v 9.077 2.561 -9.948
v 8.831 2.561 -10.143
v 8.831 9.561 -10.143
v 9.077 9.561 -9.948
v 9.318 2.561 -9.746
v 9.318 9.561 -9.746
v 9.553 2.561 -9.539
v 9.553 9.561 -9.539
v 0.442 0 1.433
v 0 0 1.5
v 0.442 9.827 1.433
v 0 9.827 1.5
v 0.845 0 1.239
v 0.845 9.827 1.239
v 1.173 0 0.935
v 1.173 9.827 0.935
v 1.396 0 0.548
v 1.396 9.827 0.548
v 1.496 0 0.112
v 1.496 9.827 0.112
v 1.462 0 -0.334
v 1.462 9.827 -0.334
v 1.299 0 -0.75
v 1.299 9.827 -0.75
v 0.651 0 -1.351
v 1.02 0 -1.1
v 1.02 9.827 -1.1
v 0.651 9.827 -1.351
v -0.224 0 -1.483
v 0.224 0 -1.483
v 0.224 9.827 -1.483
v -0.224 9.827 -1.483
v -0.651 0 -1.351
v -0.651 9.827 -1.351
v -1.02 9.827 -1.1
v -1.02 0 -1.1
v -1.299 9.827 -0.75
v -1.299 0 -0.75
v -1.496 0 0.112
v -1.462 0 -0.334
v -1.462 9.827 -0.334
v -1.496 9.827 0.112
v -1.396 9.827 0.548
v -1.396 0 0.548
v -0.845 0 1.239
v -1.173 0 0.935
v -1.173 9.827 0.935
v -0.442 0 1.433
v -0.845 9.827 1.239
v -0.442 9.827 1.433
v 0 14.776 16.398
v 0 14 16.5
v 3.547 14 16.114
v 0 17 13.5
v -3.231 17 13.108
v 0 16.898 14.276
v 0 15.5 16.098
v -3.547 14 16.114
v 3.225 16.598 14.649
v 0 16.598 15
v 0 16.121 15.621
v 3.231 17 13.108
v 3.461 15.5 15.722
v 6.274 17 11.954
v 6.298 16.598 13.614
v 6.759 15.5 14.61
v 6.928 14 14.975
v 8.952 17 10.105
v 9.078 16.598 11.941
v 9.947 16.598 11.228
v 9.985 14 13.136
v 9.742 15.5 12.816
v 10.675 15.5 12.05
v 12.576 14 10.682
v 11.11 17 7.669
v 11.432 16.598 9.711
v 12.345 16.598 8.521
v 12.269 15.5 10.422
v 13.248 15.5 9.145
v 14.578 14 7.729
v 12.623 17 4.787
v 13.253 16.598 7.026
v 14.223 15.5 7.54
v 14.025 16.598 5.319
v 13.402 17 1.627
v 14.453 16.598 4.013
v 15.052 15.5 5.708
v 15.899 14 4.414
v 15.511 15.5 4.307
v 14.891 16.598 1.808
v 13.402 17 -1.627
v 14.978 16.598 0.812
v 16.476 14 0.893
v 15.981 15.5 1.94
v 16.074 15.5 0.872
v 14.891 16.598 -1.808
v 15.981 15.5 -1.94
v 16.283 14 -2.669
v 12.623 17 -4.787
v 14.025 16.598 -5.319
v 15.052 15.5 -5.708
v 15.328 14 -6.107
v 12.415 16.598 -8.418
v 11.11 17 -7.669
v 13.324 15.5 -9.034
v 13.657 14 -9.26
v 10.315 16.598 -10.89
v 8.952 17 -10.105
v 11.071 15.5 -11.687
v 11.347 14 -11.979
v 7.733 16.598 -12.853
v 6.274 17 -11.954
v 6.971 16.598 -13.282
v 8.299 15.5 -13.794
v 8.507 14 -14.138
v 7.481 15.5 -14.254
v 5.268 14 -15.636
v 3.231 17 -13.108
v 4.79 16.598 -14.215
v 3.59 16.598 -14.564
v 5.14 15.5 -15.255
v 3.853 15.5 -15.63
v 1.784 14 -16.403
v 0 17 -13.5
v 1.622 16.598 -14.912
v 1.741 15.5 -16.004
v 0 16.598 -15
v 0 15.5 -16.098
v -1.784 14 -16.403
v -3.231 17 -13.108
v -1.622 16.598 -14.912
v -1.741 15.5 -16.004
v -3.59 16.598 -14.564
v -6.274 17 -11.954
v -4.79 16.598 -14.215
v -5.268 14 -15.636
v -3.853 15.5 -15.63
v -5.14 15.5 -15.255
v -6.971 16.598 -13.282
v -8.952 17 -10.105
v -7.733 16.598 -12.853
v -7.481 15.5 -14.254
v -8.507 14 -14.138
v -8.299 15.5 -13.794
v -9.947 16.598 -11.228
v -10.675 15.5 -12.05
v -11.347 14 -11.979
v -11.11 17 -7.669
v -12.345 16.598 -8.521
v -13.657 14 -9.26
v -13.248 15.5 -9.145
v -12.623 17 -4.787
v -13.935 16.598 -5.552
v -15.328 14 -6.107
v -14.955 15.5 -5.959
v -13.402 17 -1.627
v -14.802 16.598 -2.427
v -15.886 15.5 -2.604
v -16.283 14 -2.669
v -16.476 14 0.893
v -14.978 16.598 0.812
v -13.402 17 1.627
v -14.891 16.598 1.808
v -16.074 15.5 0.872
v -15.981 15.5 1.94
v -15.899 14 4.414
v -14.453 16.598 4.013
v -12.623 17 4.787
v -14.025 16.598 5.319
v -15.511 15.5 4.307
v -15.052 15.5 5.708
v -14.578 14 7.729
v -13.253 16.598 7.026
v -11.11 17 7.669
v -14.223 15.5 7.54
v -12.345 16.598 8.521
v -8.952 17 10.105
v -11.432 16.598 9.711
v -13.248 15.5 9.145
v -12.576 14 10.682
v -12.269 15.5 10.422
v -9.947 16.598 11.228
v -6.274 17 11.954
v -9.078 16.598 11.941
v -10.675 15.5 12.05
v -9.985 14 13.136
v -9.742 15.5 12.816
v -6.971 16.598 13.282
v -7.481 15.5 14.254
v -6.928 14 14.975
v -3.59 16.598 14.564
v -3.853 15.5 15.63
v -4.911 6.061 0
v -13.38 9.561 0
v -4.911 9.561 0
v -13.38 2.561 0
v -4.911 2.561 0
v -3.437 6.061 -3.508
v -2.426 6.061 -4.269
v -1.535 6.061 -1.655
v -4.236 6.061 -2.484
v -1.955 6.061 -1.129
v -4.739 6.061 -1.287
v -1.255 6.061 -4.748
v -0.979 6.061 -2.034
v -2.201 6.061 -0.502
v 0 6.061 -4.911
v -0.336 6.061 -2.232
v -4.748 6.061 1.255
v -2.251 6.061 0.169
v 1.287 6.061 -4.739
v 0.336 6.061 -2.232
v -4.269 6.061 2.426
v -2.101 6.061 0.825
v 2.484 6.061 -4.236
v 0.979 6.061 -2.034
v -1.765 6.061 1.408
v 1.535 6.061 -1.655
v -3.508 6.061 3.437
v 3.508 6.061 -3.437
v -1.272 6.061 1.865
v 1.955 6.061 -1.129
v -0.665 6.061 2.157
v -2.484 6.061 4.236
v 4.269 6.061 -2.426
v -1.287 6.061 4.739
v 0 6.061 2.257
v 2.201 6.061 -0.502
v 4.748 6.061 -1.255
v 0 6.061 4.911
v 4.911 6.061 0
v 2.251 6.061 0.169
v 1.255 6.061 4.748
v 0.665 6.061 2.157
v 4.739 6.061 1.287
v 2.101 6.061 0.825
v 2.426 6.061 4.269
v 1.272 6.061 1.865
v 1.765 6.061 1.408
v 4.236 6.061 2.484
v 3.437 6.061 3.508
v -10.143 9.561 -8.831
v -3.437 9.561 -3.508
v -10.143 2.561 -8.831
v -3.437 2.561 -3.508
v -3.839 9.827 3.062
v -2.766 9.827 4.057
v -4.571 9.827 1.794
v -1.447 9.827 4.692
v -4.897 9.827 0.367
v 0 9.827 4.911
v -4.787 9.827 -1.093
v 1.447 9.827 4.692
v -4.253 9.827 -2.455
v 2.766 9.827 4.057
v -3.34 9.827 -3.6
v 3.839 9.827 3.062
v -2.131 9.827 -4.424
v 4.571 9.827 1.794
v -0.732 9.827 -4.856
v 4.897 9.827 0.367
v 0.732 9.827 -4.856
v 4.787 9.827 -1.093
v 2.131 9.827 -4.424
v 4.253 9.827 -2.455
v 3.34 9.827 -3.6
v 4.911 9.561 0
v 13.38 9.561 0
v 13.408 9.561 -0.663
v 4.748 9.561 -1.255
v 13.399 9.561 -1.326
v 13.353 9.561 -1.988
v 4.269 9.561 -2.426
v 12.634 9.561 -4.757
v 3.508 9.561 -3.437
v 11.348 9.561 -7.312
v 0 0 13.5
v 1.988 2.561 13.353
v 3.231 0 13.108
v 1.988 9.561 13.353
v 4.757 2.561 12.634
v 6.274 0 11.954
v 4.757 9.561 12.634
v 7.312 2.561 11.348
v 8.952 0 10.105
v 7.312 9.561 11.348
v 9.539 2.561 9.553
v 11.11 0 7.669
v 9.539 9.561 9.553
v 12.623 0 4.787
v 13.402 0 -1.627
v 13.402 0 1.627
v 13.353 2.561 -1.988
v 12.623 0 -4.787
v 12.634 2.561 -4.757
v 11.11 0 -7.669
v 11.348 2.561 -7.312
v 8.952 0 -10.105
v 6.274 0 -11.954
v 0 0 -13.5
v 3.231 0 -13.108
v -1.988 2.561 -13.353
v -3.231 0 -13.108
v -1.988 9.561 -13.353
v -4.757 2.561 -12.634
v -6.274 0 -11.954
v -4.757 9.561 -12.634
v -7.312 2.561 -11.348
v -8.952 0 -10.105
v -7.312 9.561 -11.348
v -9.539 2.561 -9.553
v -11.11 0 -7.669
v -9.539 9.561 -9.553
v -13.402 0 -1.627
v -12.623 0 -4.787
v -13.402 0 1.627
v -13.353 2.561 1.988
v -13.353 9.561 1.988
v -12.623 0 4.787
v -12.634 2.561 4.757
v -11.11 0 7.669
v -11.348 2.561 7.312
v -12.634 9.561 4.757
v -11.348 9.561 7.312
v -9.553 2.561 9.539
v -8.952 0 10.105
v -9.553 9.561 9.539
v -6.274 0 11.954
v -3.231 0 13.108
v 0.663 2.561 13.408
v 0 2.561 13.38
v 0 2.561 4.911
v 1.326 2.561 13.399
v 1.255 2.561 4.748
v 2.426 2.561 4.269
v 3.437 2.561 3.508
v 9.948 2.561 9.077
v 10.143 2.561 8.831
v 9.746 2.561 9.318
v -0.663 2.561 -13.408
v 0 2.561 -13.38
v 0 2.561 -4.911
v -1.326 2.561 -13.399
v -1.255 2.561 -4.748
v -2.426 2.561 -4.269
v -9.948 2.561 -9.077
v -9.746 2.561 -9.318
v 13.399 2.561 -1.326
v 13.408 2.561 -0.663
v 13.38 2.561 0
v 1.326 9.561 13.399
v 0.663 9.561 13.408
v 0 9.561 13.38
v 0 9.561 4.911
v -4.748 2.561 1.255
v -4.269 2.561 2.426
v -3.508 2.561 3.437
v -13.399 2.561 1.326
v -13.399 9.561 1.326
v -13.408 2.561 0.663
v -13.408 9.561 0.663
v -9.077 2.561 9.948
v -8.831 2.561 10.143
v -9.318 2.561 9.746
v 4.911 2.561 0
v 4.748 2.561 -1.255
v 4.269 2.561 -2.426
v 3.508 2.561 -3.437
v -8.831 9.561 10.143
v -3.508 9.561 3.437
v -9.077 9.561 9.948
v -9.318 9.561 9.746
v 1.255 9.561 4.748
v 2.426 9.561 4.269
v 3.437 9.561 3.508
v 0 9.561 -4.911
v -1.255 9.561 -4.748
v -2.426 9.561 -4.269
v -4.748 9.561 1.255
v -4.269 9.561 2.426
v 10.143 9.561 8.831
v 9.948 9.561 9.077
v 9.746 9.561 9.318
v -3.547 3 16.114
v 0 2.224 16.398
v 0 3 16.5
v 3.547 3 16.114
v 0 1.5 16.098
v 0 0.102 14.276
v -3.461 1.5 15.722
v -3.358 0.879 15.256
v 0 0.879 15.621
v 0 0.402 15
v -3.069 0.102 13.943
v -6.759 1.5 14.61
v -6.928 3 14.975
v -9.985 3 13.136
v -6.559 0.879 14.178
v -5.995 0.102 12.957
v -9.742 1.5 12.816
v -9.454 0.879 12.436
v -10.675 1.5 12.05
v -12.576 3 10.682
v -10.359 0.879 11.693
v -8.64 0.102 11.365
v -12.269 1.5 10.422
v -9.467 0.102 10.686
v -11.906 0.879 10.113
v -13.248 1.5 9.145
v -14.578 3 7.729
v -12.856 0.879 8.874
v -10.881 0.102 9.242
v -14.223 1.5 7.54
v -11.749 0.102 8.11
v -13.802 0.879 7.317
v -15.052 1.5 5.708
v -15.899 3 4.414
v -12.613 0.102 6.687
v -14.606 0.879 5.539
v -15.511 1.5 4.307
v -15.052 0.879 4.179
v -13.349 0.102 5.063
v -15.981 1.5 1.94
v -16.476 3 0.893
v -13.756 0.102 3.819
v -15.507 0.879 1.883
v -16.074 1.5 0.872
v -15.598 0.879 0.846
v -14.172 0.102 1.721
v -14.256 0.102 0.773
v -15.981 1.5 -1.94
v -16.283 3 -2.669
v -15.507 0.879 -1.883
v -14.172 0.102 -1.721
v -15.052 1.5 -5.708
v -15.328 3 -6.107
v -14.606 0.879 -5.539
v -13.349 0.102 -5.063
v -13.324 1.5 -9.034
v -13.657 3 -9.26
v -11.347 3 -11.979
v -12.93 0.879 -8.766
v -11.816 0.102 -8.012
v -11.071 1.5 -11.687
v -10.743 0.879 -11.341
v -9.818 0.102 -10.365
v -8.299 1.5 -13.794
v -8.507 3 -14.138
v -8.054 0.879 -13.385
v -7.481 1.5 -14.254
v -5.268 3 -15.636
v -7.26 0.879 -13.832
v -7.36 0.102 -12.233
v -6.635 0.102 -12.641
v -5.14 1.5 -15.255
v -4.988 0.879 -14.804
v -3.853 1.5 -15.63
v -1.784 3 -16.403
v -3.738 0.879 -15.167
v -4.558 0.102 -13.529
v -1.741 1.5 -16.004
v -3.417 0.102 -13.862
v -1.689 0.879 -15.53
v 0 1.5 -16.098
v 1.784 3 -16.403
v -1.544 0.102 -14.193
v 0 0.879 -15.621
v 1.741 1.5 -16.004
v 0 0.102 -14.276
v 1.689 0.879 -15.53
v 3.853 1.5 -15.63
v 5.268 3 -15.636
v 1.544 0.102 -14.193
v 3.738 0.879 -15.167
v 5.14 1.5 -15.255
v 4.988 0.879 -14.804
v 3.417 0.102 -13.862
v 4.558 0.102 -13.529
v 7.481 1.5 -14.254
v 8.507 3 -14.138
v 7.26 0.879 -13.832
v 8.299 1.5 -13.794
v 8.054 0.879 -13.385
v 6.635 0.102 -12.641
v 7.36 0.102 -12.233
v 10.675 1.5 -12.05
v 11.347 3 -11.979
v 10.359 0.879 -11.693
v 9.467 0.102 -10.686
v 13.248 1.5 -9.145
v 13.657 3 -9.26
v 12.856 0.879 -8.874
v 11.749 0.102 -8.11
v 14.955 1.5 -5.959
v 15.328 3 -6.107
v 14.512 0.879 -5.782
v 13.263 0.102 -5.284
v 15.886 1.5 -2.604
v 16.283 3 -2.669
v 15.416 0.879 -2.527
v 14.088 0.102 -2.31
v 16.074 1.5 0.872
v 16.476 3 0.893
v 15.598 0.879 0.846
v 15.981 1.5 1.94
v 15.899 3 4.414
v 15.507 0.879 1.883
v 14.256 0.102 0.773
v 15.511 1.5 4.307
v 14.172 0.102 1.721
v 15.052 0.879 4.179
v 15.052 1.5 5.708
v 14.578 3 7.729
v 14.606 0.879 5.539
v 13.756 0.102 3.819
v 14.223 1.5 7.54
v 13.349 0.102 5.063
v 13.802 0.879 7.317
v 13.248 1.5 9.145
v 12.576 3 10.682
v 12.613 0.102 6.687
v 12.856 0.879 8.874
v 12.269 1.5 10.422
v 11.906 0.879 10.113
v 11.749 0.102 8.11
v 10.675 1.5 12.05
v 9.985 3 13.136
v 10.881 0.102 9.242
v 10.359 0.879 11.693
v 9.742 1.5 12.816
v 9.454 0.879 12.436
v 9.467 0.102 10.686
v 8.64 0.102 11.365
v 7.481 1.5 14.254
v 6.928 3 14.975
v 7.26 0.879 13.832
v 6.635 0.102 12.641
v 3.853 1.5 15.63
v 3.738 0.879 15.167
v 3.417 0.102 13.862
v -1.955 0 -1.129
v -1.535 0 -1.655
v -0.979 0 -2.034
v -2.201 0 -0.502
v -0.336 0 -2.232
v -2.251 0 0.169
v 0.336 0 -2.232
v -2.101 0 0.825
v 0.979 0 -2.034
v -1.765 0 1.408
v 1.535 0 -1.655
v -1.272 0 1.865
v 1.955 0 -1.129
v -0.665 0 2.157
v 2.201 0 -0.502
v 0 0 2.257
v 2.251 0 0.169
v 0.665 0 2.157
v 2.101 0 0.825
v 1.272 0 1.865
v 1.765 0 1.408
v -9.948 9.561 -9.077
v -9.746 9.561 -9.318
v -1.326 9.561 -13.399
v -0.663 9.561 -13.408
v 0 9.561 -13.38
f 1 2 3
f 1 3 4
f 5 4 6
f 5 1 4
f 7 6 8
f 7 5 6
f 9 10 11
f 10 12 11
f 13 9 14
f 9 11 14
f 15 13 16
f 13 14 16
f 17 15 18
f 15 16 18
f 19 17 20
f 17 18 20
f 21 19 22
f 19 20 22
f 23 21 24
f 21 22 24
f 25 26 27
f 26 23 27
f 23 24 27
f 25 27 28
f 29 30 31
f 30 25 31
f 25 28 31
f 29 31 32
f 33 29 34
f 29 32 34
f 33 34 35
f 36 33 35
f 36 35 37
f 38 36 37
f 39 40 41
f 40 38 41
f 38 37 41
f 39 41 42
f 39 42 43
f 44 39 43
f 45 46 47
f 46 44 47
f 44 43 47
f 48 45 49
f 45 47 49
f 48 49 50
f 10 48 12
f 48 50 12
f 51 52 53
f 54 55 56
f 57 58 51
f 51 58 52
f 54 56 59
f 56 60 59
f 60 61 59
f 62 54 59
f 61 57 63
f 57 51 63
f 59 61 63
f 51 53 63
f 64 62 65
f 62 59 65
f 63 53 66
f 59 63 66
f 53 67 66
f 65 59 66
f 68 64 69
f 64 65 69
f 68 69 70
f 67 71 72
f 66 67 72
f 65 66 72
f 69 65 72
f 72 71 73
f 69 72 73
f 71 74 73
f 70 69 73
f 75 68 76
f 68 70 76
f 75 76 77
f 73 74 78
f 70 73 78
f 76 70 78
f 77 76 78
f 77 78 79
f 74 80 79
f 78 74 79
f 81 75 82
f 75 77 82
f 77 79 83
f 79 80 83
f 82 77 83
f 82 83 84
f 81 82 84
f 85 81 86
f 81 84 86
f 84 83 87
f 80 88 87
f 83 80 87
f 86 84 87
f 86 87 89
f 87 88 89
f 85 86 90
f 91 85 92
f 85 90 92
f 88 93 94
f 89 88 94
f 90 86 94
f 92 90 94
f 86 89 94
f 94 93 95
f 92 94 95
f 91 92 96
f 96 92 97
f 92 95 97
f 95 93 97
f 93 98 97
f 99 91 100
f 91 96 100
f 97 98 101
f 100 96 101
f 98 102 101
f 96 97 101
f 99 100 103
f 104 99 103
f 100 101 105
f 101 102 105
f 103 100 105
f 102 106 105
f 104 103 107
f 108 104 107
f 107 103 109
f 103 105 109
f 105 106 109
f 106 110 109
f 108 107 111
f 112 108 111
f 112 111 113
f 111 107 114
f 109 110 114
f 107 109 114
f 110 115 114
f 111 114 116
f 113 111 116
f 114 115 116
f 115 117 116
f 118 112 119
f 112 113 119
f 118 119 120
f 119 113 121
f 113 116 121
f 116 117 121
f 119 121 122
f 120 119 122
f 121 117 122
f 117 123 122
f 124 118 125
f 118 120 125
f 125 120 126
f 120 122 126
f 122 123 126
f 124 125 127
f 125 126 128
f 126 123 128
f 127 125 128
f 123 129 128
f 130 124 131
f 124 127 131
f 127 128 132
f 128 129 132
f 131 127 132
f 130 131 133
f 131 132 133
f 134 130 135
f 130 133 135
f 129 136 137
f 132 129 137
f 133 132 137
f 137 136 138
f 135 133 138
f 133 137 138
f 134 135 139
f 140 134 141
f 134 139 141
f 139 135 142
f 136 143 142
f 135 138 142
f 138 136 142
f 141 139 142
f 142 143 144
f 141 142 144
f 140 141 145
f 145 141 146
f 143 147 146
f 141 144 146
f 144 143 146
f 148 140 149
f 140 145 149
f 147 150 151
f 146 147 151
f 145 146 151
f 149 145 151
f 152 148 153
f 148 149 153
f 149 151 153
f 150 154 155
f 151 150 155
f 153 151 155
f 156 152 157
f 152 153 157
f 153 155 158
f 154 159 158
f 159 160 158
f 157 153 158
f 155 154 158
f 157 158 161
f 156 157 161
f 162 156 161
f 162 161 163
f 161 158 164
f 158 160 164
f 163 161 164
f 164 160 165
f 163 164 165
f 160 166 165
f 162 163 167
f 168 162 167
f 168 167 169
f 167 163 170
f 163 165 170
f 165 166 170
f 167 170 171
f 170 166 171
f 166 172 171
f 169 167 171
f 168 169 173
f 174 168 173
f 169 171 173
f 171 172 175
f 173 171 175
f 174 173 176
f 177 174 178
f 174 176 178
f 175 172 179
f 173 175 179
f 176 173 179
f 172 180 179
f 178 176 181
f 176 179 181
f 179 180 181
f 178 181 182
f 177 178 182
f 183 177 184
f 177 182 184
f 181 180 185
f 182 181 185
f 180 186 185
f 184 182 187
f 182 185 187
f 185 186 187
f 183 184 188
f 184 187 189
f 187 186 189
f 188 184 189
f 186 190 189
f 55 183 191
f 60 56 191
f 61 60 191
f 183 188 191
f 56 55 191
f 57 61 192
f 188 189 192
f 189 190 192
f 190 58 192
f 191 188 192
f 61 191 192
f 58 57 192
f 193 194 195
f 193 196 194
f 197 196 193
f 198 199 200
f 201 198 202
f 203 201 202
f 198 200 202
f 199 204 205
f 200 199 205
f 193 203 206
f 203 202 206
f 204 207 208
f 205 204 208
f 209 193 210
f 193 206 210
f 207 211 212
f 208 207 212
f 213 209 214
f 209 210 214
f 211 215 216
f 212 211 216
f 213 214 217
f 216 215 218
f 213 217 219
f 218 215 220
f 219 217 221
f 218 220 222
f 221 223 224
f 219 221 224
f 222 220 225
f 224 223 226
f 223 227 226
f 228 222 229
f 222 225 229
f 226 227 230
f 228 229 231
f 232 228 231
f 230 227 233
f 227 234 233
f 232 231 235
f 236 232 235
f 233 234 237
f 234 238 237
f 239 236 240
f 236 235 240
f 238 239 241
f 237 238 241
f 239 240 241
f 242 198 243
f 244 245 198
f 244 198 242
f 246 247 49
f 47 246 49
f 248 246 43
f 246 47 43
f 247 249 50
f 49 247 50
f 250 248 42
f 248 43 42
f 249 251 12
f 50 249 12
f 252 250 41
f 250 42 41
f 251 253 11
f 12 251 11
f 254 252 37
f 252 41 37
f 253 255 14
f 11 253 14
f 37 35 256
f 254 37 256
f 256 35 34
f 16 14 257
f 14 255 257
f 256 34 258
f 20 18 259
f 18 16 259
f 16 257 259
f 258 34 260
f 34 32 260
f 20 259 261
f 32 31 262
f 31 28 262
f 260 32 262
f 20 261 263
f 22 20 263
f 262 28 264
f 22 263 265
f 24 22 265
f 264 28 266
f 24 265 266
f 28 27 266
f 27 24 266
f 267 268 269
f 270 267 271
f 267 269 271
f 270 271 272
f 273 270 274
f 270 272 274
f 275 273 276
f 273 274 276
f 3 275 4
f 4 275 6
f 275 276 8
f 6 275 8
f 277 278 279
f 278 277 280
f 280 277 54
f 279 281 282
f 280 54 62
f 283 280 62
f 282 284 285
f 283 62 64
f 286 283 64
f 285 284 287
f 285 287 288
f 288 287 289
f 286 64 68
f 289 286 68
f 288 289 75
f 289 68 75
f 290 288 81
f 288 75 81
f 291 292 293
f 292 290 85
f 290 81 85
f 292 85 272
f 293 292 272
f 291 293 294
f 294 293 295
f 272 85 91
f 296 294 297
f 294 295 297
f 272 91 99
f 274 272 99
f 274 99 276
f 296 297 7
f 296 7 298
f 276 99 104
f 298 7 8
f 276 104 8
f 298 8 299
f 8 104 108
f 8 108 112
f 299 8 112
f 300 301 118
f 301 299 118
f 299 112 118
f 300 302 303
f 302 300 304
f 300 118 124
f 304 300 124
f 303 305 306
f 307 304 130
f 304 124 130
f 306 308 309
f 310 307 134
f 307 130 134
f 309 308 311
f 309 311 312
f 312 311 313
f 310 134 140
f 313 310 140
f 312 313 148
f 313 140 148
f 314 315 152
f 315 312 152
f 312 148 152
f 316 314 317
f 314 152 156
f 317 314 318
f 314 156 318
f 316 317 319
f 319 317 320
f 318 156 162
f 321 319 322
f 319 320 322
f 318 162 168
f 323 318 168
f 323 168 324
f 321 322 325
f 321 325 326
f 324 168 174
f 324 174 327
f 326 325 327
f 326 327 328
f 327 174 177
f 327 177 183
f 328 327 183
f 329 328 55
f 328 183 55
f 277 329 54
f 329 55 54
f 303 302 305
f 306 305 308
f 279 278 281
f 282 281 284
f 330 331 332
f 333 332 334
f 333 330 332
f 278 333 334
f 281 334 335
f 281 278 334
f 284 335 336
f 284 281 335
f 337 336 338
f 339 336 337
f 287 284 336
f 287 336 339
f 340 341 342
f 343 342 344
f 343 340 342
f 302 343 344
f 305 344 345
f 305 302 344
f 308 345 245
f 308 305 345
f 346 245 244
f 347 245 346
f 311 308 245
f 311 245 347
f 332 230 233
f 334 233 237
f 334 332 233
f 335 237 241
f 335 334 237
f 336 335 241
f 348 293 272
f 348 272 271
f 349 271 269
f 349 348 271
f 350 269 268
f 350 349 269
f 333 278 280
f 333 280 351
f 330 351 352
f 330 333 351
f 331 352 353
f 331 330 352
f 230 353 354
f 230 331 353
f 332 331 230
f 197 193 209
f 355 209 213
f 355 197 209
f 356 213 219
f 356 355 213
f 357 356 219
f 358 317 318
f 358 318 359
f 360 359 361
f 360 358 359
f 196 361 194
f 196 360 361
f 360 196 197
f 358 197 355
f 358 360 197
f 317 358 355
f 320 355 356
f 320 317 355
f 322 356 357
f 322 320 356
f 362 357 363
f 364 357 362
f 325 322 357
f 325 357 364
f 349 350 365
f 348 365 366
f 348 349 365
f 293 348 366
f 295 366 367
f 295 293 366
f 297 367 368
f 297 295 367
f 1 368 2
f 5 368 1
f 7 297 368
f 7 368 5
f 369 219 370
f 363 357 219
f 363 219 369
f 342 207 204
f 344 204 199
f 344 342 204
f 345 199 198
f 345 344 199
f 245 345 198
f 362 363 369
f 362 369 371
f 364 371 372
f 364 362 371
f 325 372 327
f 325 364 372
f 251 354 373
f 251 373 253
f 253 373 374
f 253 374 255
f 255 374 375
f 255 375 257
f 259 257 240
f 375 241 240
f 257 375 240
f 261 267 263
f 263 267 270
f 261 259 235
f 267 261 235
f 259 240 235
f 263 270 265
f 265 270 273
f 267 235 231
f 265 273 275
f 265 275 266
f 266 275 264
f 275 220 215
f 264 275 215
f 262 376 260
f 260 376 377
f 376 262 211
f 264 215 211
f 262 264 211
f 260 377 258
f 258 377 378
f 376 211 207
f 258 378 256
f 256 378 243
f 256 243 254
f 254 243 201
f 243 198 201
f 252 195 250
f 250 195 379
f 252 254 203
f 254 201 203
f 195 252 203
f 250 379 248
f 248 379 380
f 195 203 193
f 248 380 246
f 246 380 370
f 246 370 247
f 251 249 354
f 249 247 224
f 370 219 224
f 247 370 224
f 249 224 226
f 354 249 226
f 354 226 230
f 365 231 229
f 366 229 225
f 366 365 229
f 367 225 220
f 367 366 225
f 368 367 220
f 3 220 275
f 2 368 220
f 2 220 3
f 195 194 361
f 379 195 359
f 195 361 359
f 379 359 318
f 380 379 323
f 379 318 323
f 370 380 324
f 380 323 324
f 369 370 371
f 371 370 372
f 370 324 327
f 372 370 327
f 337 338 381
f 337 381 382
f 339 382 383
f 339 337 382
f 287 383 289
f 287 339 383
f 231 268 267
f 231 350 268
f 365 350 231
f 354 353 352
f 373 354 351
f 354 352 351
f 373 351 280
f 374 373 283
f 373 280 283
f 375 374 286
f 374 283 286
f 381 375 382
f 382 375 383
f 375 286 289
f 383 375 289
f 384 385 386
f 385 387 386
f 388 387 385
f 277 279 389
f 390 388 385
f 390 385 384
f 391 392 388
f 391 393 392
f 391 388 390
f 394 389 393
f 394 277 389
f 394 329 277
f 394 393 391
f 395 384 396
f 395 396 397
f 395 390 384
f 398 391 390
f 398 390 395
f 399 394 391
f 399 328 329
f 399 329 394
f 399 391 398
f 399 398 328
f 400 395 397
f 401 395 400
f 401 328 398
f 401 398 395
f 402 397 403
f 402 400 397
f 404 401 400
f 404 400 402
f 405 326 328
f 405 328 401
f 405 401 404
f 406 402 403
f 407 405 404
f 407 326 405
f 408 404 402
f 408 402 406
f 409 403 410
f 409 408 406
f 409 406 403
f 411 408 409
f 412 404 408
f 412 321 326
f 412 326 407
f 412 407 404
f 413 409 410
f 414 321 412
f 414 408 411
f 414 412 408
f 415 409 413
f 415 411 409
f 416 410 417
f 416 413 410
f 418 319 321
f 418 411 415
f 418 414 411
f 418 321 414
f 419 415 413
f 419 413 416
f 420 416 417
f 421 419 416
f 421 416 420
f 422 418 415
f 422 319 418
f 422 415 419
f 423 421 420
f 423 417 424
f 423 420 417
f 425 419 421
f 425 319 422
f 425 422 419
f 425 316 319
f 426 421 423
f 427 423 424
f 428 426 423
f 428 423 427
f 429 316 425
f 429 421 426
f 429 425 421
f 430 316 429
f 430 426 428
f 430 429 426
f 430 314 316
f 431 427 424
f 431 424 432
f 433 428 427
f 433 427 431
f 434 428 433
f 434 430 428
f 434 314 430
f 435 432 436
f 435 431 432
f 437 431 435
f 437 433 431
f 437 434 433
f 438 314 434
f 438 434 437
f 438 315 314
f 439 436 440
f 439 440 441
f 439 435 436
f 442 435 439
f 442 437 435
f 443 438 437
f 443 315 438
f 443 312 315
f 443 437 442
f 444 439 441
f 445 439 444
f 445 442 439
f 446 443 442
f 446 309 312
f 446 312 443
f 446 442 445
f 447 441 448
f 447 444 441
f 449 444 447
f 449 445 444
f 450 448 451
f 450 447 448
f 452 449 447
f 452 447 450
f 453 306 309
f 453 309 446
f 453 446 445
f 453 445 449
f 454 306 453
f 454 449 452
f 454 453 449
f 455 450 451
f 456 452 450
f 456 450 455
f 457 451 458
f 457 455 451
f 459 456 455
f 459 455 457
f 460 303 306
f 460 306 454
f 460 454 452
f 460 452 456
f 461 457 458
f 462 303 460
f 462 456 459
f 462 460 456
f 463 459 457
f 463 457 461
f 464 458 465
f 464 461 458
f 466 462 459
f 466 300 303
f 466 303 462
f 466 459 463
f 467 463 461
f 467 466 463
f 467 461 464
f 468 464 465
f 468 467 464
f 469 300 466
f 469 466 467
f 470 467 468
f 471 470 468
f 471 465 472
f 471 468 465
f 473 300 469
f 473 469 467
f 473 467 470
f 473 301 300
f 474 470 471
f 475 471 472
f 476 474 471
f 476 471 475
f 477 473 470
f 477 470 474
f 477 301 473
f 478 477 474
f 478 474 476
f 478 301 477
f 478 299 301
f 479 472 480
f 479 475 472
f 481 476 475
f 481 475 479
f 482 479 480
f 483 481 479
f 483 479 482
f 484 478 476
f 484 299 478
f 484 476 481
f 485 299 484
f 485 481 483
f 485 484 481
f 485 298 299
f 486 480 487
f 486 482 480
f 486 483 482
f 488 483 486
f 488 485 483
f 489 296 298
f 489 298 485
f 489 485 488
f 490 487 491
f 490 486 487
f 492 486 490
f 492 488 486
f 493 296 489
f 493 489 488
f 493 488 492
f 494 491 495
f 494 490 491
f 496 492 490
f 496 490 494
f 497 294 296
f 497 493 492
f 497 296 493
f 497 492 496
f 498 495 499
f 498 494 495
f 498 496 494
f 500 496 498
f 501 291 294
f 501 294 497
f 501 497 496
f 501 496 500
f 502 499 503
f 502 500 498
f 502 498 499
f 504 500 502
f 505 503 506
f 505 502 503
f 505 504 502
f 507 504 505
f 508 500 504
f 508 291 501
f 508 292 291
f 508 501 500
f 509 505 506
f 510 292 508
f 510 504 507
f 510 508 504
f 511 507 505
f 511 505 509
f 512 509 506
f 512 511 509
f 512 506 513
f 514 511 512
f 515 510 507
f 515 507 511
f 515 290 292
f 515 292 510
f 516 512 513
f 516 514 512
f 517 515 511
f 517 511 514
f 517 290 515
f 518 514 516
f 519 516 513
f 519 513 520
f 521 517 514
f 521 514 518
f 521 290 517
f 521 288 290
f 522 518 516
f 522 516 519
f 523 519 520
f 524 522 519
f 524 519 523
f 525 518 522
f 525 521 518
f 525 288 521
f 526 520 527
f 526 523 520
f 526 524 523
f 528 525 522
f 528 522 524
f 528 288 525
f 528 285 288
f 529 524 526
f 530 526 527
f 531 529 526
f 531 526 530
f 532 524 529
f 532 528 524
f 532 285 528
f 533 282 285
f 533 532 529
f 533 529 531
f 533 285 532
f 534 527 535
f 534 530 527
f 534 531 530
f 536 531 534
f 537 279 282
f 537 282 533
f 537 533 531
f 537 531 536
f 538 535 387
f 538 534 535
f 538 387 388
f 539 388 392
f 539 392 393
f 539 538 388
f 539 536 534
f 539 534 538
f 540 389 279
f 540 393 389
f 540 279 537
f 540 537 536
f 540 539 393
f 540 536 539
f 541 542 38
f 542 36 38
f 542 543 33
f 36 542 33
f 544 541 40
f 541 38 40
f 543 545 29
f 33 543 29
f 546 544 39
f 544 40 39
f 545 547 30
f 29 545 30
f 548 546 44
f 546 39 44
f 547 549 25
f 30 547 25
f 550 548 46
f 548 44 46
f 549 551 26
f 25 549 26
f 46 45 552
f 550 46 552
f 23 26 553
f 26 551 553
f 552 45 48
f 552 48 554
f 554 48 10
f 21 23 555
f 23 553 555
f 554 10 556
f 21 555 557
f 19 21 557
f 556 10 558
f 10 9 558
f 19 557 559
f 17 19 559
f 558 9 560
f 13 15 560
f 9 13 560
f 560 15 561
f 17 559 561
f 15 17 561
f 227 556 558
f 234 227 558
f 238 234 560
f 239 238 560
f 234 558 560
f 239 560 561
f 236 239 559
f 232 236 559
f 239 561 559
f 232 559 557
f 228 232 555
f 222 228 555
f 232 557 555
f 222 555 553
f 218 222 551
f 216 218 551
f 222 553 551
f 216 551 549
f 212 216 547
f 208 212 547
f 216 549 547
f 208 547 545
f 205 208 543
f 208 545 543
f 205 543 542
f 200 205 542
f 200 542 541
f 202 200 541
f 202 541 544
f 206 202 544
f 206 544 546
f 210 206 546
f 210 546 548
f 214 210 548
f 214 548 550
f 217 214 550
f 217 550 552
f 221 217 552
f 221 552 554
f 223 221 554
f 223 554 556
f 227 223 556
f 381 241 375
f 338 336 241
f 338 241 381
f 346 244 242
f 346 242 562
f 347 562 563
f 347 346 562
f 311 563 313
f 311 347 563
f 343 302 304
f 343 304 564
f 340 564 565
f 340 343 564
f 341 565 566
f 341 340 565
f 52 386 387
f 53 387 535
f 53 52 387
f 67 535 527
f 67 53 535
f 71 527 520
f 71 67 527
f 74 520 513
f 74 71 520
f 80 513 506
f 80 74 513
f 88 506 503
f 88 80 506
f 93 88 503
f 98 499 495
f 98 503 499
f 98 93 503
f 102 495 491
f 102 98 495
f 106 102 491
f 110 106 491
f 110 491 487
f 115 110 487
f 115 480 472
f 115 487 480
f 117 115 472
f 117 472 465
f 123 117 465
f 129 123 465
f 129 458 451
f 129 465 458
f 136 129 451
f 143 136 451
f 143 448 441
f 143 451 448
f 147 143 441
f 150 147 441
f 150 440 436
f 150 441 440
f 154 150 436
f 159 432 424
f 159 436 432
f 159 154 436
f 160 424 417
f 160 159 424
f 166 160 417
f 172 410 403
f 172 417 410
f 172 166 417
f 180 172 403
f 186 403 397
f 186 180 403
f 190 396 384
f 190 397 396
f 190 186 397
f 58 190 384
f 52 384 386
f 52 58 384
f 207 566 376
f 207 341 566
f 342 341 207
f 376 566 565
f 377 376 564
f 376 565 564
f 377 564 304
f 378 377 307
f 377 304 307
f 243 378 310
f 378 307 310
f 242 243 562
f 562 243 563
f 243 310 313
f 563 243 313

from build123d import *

# Parameters (mm, degrees)
F0_W     = 17
F0_H     = 3
F3_DEPTH = 3.5
F4_COUNT = 4
F5_R     = 2.99999


# Not quite as in the source:
# - a fillet or chamfer is up to 0.001 mm smaller than in the source, because OpenCascade refuses the exact size


with BuildPart() as f1:
    # F0 (on Right) → F1 (revolve)
    with BuildSketch(Plane.YZ):
        with Locations((8.5, 15)):
            Rectangle(F0_W, F0_H)
    revolve(axis=Axis((0, 4.8521989956, 0), (0, 1, 0)))



with BuildPart() as f1b:
    # F0 (on Right) → F1, piece 2 (revolve)
    with BuildSketch(Plane.YZ):
        Polygon((0, 2.2574728355), (0, 1.5), (9.8266890272, 1.5), (9.8266890272, 4.9105980434), (6.0609620996, 4.9105980434), (6.0609620996, 2.2574728355), align=None)
    revolve(axis=Axis((0, 4.8521989956, 0), (0, 1, 0)))


with BuildPart() as f1_1:
    add(f1.part)

    add(f1b.part)  # F3 merges F1b
    # F2 (on face) → F3 (join, symmetric)
    with BuildSketch(Plane.XZ.offset(-6.0609620996)):
        with BuildLine():
            Line((0, 13.3796269074), (0, 4.9105980434))
            ThreePointArc((0, 4.9105980434), (1.8559366755, 4.5463691227), (3.4365562486, 3.5077135421))
            Line((3.4365562486, 3.5077135421), (10.1425750181, 8.8311284781))
            ThreePointArc((10.1425750181, 8.8311284781), (5.6432817311, 12.3808523131), (0, 13.3796269074))
        make_face()
    extrude(amount=F3_DEPTH, both=True)

    # F4: F1 ×4 about axis
    f4_axis = Axis((0, 9.8266890272, 0), (0, 1, 0))


with BuildPart() as f1_2:
    add(f1_1.part)
    for i in range(1, F4_COUNT):
        add(f1_1.part.rotate(f4_axis, i * 360 / F4_COUNT))

    # F5 (radius 3 in the source; OpenCascade refuses exactly that, so slightly less here)
    f5_edges = [f1_2.edges().sort_by_distance(p)[0] for p in [
        (0, 0, -16.5),
        (0, 17, -16.5),
    ]]
    fillet(f5_edges, radius=F5_R)


solid = f1_2.part
